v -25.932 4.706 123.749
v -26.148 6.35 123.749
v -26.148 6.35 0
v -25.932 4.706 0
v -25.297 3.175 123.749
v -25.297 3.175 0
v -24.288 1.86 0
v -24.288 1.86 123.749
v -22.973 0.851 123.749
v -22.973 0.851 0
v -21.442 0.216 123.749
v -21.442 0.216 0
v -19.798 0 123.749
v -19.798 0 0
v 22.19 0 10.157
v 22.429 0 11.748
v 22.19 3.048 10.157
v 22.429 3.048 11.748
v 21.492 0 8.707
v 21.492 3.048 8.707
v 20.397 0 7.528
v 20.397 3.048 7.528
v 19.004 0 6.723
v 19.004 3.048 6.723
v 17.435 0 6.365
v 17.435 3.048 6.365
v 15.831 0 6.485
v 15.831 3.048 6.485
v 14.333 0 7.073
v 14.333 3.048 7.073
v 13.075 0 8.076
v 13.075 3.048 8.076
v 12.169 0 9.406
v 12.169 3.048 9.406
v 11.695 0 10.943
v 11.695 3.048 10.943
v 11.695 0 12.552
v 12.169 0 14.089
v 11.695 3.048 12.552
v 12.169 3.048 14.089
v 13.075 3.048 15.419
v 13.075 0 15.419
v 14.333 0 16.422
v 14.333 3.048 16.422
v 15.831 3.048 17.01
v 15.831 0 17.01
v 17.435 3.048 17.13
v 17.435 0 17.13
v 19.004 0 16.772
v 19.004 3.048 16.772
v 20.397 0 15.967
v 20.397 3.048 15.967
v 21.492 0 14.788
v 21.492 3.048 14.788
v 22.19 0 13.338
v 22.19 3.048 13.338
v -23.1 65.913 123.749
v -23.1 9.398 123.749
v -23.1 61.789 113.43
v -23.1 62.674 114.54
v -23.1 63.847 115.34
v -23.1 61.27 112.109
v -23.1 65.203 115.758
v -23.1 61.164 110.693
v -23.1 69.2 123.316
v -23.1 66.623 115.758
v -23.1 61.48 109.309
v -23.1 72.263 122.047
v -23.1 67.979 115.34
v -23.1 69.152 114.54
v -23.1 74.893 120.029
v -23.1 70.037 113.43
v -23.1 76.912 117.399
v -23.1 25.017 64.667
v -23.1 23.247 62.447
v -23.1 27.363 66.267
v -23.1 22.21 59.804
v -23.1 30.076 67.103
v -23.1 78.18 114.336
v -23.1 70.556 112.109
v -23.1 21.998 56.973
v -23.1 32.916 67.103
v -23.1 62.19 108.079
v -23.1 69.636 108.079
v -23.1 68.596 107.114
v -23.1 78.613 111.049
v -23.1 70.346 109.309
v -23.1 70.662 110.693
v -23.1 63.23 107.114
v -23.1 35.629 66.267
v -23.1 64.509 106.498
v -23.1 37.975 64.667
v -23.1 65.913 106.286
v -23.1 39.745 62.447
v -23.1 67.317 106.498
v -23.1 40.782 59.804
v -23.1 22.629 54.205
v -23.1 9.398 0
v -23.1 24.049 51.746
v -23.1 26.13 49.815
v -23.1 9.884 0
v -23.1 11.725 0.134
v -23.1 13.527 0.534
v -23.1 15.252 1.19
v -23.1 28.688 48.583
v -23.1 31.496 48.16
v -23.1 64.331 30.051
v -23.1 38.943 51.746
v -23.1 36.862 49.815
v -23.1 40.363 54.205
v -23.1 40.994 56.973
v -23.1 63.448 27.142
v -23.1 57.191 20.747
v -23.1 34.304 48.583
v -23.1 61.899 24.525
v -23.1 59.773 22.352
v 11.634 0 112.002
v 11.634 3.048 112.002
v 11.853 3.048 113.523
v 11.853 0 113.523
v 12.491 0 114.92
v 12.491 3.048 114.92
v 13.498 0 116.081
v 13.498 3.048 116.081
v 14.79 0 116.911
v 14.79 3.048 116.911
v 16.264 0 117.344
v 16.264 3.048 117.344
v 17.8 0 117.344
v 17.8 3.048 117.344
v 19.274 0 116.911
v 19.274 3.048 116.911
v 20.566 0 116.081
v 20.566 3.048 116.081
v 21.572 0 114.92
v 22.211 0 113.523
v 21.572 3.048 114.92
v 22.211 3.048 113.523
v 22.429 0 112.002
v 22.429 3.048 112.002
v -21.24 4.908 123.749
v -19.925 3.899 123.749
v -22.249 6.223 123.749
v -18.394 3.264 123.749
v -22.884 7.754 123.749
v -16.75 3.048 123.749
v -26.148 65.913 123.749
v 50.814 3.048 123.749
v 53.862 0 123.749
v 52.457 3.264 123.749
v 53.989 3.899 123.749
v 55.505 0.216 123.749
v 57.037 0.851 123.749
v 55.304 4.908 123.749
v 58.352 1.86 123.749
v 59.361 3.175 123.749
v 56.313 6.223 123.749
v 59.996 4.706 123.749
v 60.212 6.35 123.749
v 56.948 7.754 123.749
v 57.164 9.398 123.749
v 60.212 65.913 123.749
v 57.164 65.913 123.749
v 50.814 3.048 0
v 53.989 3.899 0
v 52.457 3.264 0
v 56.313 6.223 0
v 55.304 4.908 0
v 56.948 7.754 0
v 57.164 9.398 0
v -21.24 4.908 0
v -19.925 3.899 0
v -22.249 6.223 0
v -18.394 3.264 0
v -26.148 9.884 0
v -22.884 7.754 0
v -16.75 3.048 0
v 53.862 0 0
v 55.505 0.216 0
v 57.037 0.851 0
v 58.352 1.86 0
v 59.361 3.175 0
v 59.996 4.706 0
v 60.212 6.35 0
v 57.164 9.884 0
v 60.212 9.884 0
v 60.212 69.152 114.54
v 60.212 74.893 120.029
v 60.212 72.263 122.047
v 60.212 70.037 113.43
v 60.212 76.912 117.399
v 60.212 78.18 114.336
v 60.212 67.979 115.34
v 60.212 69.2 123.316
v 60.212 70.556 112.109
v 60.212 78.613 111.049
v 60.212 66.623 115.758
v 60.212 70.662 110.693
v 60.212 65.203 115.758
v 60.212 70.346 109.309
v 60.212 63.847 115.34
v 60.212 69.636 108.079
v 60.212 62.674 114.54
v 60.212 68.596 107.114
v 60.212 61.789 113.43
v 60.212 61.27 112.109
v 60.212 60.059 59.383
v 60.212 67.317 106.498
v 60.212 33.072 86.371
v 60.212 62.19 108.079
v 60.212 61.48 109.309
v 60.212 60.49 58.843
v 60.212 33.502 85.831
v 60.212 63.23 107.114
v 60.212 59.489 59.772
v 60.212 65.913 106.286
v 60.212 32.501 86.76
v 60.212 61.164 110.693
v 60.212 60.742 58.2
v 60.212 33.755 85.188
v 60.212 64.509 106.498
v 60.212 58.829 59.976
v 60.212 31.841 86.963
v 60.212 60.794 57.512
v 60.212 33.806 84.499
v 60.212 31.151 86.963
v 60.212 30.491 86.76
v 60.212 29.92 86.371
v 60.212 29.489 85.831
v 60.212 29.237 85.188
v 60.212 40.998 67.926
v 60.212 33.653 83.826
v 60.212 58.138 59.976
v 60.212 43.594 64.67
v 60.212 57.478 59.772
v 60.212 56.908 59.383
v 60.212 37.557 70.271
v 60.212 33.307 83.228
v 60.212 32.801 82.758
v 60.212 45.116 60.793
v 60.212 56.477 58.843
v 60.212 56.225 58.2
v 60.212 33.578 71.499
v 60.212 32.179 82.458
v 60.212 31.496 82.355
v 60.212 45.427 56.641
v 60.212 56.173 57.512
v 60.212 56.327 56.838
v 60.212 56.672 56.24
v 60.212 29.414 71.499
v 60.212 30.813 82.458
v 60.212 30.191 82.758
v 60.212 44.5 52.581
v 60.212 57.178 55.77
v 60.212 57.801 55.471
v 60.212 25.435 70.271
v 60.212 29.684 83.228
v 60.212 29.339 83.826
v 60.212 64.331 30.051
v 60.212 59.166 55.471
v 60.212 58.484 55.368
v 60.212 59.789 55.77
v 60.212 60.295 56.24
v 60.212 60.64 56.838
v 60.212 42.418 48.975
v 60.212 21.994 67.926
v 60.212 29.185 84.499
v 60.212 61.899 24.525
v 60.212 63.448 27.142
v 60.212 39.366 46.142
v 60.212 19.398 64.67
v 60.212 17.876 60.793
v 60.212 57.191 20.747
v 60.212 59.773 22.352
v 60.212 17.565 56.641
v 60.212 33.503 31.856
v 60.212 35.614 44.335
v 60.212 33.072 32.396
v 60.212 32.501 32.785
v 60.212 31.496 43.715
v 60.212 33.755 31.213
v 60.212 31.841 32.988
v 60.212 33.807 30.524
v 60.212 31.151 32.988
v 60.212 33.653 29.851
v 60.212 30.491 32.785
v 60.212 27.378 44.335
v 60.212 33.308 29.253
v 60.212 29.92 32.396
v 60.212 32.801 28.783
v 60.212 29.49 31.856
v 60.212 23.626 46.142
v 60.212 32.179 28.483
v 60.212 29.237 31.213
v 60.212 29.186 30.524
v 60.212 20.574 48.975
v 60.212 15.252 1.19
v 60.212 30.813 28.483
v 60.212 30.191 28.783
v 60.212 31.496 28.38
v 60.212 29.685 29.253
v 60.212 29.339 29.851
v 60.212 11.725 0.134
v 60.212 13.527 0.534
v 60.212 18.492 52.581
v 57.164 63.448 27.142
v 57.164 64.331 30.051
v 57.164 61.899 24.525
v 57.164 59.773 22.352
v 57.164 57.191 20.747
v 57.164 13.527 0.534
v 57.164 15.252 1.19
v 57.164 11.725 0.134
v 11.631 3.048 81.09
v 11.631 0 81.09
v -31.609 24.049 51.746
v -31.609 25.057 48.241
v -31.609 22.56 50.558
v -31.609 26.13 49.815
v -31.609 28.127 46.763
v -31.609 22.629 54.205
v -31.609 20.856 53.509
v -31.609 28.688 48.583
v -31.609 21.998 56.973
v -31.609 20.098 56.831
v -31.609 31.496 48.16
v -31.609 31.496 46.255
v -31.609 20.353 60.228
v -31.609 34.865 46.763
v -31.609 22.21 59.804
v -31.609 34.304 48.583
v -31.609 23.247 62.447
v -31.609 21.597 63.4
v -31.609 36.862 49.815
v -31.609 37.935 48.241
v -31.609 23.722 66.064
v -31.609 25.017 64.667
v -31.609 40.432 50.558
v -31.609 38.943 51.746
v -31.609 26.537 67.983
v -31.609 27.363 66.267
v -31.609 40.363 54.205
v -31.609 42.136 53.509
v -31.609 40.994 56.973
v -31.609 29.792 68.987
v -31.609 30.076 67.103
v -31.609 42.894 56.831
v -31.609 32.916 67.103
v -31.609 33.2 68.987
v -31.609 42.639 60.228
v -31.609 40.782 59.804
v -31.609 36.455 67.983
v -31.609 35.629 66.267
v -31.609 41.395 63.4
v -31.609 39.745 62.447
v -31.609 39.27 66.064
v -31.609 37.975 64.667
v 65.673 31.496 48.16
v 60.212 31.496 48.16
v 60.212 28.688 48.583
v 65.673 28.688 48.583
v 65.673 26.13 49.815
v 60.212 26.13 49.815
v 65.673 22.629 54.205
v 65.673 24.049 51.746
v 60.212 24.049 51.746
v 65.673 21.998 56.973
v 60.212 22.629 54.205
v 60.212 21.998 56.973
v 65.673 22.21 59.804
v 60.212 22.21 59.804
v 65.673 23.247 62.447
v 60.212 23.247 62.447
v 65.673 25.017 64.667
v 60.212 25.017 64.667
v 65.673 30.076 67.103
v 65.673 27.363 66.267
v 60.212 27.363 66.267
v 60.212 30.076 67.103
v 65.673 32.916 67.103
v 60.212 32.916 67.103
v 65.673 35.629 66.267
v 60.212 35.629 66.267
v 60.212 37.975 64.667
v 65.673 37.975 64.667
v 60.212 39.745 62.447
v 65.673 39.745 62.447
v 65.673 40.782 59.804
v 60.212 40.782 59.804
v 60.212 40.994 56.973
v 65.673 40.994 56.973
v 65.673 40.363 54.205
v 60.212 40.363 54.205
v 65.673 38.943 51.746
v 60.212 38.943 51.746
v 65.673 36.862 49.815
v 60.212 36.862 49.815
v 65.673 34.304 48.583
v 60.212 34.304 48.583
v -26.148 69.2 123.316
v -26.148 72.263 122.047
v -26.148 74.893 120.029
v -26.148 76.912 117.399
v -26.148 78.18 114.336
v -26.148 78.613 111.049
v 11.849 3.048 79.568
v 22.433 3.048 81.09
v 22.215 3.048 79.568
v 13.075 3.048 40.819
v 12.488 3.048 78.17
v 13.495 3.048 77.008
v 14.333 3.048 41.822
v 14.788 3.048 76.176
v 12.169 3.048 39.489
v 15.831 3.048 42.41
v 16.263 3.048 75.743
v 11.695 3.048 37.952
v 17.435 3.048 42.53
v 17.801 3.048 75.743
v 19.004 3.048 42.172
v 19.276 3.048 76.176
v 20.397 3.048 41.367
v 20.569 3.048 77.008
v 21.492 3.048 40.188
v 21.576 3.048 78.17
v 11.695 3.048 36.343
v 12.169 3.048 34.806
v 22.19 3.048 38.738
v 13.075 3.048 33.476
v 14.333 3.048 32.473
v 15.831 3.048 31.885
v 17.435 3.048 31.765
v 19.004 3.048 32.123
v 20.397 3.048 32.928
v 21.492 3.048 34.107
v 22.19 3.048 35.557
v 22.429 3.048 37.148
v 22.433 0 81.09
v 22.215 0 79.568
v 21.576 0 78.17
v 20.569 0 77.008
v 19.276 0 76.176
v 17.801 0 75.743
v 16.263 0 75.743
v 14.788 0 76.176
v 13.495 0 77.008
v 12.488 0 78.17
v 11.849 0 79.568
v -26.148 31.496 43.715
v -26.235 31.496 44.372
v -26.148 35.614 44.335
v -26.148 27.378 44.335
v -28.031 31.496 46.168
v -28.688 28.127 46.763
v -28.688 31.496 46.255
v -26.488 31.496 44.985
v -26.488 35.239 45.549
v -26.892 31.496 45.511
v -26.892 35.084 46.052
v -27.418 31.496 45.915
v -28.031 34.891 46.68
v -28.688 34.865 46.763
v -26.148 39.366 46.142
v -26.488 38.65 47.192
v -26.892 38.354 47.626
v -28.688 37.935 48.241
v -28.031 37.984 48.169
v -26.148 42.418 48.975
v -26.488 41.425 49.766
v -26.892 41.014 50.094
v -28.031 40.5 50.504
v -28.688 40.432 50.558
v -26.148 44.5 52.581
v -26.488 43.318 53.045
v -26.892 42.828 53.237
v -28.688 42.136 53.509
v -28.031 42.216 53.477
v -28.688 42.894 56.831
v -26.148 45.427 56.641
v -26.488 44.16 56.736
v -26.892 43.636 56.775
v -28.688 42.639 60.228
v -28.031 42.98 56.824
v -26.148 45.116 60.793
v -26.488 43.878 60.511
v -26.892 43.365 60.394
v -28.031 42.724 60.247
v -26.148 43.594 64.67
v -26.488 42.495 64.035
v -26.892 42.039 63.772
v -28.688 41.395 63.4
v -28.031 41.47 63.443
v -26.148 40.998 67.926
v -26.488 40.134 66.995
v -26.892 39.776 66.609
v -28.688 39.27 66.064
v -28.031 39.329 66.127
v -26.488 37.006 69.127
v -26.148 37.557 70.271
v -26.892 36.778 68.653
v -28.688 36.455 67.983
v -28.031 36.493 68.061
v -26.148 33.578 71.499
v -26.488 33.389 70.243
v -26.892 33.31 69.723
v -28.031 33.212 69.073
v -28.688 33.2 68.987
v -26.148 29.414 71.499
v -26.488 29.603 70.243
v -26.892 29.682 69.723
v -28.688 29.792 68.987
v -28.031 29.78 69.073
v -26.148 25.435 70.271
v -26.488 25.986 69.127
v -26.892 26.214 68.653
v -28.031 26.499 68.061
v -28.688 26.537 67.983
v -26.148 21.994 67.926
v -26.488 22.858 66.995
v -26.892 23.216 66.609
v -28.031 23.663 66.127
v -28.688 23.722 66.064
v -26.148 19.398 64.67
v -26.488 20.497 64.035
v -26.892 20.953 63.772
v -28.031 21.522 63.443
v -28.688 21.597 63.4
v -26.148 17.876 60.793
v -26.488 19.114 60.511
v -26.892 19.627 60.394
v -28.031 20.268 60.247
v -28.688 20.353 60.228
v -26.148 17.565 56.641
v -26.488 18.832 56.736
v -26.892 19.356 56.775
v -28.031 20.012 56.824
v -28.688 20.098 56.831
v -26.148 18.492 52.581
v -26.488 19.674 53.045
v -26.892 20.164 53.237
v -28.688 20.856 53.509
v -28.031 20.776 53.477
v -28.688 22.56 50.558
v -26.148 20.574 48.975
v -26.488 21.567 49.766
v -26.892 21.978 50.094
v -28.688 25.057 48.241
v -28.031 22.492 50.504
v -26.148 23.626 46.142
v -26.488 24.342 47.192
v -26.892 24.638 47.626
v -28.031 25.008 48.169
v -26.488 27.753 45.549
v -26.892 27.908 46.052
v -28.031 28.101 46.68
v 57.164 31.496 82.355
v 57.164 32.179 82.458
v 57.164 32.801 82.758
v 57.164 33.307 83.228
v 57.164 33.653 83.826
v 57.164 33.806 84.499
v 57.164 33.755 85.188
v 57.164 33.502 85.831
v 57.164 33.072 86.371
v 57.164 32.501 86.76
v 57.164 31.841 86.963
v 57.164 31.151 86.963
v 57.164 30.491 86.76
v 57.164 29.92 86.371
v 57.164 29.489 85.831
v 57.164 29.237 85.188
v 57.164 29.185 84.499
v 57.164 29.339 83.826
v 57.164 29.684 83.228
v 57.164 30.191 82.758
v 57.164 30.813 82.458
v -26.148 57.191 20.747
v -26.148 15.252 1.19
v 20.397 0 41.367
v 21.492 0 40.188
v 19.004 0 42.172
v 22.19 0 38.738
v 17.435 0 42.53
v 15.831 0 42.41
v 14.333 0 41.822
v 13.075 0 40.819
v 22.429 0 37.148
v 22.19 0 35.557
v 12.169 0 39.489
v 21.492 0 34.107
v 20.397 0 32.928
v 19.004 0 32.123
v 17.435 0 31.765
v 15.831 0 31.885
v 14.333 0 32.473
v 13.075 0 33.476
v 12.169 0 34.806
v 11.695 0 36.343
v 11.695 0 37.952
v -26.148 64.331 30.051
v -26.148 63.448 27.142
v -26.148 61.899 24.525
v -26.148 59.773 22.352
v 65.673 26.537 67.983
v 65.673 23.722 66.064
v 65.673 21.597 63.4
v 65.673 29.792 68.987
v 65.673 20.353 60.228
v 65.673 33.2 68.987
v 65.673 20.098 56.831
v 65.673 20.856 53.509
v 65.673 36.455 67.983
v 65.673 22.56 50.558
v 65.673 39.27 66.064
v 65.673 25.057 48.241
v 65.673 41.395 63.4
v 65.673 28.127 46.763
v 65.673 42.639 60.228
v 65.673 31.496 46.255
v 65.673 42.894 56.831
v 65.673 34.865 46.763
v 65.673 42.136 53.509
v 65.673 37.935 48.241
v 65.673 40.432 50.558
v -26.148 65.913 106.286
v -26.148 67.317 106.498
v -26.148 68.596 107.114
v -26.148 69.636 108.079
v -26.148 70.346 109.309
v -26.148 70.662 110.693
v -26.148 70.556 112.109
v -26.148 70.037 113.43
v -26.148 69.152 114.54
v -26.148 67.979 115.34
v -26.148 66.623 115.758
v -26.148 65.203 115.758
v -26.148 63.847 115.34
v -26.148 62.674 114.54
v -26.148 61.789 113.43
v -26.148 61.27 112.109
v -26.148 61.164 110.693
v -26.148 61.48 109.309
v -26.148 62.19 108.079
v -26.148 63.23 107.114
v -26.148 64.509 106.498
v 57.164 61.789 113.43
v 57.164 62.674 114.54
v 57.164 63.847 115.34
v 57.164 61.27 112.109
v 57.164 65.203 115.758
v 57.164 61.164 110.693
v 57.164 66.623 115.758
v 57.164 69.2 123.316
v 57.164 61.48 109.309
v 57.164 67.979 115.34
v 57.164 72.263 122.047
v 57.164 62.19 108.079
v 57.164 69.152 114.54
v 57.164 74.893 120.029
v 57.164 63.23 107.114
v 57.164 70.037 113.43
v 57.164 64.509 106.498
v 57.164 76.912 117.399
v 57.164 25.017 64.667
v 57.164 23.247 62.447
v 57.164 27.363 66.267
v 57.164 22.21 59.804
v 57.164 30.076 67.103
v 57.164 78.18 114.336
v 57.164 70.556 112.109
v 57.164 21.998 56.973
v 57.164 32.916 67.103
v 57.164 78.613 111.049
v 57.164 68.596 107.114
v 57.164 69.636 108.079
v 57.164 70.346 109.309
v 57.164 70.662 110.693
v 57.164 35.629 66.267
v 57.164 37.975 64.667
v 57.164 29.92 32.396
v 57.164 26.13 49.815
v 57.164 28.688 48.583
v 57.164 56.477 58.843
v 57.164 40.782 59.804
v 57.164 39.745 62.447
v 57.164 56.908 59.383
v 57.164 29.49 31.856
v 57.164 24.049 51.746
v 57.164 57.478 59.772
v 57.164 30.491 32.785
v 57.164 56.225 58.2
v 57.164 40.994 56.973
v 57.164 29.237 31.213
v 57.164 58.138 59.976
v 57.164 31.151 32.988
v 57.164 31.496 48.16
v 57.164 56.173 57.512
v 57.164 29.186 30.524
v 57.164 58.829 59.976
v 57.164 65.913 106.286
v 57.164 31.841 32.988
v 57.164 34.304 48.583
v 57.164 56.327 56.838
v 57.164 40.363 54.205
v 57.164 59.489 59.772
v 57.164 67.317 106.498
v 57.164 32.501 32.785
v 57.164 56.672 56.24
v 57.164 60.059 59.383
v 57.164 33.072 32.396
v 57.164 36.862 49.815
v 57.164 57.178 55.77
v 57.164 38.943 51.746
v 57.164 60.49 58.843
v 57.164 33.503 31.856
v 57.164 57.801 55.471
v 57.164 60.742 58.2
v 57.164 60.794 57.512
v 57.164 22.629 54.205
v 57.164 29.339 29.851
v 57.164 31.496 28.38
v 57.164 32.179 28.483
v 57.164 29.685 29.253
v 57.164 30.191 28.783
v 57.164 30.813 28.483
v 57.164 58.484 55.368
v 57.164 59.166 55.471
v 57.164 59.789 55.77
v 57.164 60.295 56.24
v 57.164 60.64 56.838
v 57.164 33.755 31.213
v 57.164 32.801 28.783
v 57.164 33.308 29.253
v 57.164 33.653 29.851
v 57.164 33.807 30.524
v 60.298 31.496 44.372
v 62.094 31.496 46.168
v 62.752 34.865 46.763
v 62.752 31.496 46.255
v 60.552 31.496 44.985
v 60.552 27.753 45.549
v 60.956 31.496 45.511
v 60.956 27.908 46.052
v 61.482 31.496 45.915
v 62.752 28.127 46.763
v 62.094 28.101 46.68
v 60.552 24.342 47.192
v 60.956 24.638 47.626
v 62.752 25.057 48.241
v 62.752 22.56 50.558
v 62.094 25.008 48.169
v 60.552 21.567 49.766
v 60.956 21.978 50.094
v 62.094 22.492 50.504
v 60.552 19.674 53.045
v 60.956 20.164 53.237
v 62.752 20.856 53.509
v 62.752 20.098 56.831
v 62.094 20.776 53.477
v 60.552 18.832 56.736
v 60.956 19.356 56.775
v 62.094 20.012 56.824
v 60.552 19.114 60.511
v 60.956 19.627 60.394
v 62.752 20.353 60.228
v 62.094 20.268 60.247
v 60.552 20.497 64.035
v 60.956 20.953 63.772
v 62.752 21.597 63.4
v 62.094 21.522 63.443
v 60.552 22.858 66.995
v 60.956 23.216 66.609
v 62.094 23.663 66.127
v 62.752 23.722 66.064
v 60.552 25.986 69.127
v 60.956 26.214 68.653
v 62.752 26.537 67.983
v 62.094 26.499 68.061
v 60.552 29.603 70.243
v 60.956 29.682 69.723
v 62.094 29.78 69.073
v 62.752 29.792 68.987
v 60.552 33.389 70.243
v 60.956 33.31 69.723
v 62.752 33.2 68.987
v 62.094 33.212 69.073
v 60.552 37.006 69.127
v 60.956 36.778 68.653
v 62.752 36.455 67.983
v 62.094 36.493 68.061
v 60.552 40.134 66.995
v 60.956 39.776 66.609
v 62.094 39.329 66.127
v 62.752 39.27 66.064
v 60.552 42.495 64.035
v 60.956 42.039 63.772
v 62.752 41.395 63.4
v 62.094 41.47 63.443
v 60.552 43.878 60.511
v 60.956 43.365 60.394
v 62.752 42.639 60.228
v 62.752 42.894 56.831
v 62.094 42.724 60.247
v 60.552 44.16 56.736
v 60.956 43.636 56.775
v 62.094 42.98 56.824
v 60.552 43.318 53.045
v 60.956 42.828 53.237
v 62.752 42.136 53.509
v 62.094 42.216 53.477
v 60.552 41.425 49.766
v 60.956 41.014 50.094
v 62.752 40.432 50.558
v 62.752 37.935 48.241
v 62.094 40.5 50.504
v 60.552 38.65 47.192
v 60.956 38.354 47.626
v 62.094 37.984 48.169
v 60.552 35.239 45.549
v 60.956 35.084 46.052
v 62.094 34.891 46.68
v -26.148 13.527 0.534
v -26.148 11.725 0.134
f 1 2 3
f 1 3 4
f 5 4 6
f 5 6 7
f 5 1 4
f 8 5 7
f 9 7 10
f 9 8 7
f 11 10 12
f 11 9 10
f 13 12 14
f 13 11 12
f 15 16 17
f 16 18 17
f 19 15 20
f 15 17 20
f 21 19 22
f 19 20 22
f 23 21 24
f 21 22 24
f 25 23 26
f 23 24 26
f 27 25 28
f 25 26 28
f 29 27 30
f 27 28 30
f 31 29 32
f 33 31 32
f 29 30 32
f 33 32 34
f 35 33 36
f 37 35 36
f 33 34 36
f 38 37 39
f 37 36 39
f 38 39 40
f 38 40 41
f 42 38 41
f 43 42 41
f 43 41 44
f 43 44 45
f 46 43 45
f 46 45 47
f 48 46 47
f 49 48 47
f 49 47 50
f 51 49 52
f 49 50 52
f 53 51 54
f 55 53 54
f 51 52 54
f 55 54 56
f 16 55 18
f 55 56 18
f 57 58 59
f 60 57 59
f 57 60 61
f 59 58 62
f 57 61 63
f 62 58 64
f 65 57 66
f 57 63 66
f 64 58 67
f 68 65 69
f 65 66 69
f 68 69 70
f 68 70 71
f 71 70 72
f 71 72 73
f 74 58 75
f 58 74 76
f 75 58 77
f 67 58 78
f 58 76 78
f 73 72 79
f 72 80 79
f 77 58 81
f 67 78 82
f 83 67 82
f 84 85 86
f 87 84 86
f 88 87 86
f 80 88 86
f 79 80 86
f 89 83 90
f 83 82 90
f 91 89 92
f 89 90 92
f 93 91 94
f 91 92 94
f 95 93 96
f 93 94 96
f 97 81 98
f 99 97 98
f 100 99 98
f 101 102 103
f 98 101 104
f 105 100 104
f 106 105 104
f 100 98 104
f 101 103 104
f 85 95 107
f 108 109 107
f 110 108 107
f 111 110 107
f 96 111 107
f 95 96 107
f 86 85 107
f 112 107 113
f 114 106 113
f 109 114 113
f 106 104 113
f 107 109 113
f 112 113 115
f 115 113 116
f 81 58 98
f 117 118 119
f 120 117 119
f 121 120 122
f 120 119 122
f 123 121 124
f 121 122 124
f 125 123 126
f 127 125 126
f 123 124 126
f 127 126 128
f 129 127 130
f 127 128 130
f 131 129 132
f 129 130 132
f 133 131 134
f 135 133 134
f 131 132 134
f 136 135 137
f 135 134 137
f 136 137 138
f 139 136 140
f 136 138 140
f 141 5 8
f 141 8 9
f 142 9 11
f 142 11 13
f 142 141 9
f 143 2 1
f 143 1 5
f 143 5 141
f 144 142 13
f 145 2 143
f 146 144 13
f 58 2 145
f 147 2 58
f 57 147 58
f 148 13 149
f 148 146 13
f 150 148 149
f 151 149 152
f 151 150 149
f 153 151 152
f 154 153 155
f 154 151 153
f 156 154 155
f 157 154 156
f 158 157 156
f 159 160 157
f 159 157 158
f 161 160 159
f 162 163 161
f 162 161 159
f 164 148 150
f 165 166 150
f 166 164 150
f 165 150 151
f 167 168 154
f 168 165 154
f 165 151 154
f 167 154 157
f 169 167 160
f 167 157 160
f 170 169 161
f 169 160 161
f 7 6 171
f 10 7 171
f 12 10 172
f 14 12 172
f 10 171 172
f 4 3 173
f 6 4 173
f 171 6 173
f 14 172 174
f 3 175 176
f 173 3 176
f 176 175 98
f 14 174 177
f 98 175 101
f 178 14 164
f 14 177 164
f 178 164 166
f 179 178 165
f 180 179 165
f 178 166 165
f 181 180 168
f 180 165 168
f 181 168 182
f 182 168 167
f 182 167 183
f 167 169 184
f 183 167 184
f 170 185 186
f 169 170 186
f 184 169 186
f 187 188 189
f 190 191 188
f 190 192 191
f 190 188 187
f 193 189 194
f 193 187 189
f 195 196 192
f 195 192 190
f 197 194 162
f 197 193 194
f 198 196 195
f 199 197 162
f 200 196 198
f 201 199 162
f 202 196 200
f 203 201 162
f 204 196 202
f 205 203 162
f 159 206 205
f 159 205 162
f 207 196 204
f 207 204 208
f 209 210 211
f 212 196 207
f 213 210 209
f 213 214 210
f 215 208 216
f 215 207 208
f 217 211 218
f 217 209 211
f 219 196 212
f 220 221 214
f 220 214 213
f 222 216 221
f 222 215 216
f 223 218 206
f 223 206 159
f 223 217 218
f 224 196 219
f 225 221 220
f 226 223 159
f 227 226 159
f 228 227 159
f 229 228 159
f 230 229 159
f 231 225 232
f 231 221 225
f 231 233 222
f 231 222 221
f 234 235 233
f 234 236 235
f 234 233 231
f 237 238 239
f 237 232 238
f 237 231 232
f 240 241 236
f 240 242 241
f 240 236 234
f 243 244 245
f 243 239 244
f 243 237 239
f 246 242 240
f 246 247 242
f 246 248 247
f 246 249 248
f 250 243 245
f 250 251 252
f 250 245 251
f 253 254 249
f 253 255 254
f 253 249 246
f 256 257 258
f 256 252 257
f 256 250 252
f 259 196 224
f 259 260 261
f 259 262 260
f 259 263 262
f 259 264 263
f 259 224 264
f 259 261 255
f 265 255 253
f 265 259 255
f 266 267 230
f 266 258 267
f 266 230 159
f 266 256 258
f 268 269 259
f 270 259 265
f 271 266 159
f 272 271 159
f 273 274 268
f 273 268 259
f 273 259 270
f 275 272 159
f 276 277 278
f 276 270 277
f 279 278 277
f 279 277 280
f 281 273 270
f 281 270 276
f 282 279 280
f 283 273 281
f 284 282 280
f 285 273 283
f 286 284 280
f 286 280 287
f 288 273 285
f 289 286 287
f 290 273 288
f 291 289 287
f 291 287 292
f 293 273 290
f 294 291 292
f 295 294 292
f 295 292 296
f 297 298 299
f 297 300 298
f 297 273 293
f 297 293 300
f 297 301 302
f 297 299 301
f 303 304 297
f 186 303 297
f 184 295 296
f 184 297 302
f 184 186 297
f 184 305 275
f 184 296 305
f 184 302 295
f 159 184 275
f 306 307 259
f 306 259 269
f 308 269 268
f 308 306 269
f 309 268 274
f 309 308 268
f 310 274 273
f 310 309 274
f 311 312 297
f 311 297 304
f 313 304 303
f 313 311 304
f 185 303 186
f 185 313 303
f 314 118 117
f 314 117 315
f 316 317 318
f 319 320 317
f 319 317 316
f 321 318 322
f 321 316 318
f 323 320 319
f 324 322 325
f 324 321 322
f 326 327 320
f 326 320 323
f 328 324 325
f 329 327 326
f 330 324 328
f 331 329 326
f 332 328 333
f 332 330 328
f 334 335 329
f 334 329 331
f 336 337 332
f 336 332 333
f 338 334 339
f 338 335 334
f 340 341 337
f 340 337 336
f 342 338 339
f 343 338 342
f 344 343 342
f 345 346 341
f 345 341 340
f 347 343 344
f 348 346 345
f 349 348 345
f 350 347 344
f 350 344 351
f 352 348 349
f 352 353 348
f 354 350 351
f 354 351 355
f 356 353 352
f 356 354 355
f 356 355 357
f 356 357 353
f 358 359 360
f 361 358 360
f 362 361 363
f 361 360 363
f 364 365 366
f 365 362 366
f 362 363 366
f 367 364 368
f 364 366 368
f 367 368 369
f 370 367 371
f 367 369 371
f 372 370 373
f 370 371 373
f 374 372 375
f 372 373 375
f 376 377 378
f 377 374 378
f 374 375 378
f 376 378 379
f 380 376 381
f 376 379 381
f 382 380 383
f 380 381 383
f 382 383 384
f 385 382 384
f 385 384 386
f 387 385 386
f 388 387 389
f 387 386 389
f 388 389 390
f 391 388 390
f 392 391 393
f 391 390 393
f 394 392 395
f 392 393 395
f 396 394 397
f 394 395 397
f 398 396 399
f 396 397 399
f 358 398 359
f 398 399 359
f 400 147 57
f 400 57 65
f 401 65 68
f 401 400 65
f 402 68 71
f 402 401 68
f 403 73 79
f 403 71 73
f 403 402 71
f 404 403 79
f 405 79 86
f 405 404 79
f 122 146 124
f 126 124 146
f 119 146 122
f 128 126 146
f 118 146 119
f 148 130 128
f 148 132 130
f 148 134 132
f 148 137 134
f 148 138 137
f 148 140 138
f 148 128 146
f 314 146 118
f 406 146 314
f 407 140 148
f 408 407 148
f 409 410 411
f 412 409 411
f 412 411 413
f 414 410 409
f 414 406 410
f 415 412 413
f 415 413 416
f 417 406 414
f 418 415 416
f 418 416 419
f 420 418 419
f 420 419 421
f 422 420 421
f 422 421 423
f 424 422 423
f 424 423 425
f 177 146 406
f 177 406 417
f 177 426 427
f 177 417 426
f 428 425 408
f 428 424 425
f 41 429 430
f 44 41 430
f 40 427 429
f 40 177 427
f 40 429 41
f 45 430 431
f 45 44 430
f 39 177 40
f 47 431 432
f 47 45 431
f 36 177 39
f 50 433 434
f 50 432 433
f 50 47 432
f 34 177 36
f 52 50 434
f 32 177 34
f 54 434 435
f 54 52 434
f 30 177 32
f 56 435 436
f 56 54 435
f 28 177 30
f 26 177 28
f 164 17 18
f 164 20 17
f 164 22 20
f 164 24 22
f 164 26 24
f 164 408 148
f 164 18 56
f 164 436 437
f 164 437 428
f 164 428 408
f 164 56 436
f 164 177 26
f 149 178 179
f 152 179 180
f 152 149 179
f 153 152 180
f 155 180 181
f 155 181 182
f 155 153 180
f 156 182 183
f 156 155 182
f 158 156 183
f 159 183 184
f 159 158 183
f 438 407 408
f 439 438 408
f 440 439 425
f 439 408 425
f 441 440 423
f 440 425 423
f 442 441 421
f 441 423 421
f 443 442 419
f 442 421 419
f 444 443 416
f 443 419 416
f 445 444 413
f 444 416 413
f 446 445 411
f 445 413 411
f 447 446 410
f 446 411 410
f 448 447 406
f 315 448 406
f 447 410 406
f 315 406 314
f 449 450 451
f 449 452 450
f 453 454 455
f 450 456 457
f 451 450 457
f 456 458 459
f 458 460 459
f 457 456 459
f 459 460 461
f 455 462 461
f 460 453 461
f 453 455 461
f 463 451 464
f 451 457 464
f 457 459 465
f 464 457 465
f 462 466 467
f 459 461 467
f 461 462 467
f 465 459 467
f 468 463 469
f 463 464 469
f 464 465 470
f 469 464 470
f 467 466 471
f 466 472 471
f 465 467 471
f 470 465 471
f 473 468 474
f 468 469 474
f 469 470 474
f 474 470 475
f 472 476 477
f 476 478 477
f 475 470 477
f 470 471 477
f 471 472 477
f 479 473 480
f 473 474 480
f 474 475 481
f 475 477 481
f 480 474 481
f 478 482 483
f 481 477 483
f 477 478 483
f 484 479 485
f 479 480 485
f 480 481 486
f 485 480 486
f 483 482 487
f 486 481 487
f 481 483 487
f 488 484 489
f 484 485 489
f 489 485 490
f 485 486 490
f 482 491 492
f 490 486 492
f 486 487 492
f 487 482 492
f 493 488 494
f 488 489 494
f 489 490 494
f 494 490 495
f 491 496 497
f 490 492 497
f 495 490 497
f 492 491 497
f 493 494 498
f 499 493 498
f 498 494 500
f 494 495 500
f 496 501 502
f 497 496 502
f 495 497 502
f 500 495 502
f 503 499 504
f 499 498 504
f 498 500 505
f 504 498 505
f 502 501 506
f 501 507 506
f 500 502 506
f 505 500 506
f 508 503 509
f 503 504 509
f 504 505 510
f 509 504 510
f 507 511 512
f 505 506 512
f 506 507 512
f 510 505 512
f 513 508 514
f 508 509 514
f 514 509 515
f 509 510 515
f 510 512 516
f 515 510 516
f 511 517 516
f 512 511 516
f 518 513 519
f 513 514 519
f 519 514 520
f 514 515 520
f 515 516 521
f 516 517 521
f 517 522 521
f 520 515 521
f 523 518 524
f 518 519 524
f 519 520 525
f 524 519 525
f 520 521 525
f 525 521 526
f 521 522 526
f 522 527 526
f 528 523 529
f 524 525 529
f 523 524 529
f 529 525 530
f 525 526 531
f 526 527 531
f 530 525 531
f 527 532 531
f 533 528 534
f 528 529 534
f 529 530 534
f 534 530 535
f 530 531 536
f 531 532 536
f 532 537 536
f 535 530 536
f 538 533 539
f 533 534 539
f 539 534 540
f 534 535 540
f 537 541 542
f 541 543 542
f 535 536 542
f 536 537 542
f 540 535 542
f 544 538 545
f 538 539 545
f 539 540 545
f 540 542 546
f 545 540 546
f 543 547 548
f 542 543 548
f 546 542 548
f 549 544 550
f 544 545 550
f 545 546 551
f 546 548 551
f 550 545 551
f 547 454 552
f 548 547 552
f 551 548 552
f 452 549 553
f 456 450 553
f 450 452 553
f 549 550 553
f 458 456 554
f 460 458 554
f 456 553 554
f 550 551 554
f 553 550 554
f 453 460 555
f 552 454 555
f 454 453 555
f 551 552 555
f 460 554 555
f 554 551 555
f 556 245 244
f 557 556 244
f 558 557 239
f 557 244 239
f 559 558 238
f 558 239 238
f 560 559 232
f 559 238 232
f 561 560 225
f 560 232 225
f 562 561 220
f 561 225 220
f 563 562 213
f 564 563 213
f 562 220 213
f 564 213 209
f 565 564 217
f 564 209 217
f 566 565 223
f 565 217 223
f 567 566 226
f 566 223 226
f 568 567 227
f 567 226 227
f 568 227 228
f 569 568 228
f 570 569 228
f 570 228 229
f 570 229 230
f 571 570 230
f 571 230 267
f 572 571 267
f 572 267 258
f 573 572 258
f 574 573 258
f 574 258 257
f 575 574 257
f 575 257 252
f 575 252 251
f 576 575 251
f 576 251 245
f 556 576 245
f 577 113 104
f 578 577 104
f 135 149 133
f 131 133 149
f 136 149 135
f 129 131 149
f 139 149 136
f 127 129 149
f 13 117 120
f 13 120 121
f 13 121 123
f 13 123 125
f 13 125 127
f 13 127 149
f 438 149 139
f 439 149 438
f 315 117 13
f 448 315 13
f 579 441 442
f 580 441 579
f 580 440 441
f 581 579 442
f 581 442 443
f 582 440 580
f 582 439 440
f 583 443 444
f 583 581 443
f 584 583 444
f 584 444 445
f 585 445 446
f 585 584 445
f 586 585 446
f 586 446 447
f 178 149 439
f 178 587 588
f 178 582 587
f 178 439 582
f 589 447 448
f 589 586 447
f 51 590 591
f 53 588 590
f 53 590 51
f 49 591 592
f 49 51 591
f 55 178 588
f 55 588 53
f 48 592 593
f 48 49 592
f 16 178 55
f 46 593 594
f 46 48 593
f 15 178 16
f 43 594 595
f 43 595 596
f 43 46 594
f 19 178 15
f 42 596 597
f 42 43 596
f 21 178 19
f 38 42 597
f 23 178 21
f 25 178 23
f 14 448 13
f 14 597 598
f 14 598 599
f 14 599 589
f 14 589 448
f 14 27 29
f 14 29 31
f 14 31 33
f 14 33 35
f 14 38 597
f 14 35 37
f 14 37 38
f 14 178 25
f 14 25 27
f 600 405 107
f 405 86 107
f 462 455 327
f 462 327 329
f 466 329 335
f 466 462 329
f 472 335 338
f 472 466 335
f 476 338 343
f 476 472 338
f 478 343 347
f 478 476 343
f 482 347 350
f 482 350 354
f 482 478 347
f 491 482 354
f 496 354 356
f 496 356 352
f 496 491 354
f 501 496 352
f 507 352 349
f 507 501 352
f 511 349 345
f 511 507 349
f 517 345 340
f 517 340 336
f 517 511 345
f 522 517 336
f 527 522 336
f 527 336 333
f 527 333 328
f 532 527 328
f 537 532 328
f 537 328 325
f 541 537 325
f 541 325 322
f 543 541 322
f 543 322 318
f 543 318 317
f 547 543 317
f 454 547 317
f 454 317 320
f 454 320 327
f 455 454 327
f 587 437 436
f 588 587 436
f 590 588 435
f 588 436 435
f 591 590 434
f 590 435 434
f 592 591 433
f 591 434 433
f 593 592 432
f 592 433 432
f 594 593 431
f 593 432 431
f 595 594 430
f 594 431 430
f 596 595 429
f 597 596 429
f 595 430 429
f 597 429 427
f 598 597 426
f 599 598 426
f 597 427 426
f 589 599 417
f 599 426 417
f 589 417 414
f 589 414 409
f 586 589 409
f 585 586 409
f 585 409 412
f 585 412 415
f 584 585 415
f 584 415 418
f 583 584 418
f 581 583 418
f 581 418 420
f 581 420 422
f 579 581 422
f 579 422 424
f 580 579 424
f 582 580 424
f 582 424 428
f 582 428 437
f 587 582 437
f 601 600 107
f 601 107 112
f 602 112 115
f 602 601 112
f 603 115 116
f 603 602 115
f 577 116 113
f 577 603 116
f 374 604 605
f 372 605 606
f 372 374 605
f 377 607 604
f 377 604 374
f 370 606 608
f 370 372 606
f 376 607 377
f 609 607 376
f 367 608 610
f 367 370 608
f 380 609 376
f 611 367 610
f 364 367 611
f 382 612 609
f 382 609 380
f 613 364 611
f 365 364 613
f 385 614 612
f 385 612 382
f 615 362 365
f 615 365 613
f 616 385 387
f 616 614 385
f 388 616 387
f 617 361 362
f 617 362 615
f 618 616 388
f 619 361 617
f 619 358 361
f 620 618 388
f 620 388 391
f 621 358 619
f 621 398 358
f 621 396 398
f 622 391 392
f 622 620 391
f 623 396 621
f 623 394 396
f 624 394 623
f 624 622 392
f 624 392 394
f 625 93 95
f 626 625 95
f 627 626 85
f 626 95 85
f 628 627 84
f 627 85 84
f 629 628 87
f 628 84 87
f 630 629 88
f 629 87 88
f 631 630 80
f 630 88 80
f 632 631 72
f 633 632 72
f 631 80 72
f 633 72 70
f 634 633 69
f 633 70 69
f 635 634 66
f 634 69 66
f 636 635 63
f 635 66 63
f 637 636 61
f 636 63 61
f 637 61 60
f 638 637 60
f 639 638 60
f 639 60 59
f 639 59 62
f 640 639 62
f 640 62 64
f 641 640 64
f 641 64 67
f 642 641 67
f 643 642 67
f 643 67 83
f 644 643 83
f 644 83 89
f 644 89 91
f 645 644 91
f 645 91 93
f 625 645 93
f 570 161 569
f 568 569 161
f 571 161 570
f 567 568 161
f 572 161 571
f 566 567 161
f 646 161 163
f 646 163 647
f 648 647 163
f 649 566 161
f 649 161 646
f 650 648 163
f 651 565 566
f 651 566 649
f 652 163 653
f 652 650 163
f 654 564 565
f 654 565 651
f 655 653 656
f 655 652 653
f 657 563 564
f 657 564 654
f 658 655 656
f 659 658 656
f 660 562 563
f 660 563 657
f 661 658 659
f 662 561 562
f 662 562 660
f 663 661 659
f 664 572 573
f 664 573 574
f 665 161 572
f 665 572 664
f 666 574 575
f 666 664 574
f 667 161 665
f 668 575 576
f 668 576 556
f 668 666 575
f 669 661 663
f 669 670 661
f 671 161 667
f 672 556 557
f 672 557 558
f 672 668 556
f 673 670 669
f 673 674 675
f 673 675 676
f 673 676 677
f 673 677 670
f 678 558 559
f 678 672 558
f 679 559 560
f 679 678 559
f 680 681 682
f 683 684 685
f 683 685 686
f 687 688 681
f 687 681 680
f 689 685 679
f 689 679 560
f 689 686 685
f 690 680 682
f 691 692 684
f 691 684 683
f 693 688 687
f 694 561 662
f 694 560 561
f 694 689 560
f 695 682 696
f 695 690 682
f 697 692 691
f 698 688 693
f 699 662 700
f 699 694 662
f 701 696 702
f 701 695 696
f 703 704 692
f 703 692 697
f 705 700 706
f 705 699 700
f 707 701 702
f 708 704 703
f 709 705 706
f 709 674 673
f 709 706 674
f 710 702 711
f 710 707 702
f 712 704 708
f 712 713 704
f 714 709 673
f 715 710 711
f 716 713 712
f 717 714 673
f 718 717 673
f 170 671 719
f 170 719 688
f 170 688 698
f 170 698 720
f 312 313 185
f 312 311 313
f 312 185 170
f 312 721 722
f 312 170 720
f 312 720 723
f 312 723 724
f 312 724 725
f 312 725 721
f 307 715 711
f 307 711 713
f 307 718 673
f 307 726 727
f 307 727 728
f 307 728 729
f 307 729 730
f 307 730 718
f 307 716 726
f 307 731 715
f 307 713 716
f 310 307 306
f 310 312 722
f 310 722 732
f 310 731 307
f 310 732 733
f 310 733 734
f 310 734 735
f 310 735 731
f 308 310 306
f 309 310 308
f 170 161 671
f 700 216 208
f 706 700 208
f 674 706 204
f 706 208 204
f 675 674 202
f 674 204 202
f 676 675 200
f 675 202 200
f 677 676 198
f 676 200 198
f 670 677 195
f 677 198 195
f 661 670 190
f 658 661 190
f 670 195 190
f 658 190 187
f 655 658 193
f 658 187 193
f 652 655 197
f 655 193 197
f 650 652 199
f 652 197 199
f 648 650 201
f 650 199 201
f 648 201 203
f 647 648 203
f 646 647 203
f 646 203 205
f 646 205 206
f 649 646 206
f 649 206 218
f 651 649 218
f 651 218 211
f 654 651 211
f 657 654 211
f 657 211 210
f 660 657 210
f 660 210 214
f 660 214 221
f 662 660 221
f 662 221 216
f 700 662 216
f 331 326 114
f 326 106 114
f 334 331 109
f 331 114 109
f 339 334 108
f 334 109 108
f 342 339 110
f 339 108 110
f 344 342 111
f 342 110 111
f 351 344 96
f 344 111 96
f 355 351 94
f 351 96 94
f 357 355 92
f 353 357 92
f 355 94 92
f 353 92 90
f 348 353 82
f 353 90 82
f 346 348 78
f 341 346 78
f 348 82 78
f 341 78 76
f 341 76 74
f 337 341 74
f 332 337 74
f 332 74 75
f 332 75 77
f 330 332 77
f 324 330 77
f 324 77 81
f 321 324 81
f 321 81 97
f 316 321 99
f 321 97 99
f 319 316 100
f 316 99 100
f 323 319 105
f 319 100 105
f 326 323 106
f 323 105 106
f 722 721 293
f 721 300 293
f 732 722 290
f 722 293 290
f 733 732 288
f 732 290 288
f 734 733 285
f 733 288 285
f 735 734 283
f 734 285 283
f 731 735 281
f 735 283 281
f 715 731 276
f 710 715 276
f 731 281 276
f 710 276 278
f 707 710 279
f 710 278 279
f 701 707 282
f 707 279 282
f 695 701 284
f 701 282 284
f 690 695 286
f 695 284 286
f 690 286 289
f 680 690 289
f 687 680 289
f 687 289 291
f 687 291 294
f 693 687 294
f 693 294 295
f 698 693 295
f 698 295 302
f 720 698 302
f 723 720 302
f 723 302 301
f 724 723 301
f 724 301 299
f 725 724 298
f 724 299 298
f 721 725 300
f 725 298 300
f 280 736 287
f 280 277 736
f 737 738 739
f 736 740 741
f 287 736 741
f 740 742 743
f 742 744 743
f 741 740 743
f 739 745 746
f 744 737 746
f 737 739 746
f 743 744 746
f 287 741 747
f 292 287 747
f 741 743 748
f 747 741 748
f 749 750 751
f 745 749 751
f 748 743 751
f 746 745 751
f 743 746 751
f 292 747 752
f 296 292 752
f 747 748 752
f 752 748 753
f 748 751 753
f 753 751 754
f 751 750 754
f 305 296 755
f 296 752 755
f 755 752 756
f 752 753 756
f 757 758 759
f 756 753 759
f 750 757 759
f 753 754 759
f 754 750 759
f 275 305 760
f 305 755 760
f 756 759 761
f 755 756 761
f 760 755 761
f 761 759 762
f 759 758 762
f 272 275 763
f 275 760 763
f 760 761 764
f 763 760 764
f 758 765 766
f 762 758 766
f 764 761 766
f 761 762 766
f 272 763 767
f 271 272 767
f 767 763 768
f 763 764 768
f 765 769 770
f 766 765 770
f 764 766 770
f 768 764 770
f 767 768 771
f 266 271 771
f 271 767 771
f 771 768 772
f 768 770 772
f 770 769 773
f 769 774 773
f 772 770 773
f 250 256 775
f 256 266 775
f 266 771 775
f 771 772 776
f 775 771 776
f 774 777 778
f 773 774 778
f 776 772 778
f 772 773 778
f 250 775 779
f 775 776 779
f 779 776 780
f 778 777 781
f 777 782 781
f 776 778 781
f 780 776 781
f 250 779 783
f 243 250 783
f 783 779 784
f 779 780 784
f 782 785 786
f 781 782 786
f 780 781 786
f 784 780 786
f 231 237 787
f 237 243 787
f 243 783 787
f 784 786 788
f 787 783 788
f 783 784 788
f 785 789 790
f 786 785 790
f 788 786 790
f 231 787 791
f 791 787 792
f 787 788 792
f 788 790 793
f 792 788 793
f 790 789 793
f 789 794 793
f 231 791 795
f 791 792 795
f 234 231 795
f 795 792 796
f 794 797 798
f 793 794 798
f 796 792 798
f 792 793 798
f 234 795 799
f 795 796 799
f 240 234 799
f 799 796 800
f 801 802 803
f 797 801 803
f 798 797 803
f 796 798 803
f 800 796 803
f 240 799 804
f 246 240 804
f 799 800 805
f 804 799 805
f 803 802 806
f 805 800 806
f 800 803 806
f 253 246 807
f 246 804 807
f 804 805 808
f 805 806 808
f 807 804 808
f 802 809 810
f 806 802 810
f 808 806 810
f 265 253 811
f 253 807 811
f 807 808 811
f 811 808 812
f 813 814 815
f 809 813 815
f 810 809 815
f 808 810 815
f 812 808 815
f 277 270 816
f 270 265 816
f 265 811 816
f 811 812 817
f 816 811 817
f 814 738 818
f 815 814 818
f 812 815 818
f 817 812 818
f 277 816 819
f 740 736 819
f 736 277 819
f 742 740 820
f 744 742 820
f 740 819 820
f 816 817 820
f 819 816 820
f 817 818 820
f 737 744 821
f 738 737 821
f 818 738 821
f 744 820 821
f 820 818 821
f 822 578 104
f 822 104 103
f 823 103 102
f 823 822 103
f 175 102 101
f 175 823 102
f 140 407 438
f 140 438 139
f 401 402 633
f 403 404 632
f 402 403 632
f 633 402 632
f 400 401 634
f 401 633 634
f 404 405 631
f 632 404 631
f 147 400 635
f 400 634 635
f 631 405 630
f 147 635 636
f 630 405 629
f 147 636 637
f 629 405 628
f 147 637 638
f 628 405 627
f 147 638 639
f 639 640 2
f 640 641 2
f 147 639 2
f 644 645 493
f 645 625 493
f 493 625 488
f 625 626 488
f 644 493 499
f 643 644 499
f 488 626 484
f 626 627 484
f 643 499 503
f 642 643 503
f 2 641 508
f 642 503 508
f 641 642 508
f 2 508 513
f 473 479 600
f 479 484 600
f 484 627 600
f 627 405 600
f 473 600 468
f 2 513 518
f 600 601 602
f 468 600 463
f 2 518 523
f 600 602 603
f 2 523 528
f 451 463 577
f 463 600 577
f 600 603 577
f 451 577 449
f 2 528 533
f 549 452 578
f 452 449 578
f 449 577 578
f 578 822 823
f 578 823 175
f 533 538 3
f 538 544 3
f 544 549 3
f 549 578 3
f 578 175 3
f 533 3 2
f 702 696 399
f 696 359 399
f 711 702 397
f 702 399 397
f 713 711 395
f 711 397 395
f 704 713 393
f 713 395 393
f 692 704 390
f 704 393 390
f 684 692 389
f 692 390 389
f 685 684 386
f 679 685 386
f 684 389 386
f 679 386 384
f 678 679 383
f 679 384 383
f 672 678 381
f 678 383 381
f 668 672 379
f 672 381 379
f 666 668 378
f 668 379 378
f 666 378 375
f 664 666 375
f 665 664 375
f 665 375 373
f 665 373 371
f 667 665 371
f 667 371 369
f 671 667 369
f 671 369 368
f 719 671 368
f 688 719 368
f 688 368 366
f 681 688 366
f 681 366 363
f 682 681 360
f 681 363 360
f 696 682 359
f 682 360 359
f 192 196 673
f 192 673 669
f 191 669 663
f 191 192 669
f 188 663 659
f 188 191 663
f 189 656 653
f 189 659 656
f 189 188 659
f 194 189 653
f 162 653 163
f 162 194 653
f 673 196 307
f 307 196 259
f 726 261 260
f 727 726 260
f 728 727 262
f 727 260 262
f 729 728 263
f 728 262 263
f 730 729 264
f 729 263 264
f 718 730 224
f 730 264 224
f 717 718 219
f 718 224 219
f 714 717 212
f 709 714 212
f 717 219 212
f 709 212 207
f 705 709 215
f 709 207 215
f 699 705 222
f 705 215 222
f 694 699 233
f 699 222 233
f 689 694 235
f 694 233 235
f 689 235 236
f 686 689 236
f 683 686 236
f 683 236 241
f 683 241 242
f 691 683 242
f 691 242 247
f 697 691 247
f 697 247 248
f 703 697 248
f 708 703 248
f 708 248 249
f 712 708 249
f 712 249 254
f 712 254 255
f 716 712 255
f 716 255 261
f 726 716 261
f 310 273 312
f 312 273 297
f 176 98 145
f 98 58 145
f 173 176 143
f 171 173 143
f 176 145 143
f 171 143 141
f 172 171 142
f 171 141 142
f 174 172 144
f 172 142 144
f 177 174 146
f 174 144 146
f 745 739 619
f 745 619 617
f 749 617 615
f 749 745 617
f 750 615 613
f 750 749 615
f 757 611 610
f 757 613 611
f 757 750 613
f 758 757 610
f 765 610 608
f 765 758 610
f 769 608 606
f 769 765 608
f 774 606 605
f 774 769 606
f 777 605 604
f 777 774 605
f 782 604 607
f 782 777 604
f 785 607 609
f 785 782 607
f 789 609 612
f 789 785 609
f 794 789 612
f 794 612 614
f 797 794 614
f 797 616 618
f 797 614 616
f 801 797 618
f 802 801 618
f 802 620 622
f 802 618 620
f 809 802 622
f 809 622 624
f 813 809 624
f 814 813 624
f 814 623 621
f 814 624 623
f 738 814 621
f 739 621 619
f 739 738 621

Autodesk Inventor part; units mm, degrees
ref_plane "YZ Plane" through (0, 0, 0) normal (1, 0, 0) x (0, 1, 0)
ref_plane "XZ Plane" through (0, 0, 0) normal (0, 1, 0) x (-1, 0, 0)
sketch "Sketch1" plane through (0, 0, 0) normal (0, 0, 1) x (1, 0, 0)
  line L0 (-26.1481, 3.048) -> (60.2119, 3.048)
  line L1 (60.2119, 3.048) -> (60.2119, 0)
  line L2 (60.2119, 0) -> (-26.1481, 0)
  line L3 (-26.1481, 0) -> (-26.1481, 3.048)
  line L4 (-26.1481, 0) -> (-23.1001, 0)
  line L5 (-23.1001, 0) -> (-23.1001, 78.613)
  line L6 (-23.1001, 78.613) -> (-26.1481, 78.613)
  line L7 (-26.1481, 78.613) -> (-26.1481, 0)
  line L8 (60.2119, 0) -> (57.1639, 0)
  line L9 (57.1639, 0) -> (57.1639, 78.613)
  line L10 (57.1639, 78.613) -> (60.2119, 78.613)
  line L11 (60.2119, 78.613) -> (60.2119, 0)
  point P0 (0, 0)
  dimension "d0" = 86.36
  dimension "d1" = 3.048
  dimension "d2" = 3.048
  dimension "d3" = 3.048
  dimension "d4" = 78.613
  dimension "d5" = 0
extrude "Extrusion1" add sketch "Sketch1" along normal blind 123.7488
fillet "Fillet1" radius 12.7 2 edges at (58.6879, 78.613, 123.7488) (-24.6241, 78.613, 123.7488)
sketch "Sketch2" plane through (60.2119, 0, 0) normal (1, 0, 0) x (0, 0, -1)
  arc A0 (-111.0488, 78.613) -> (-123.7488, 65.913) centre (-111.0488, 65.913) ccw projected
  circle A1 centre (-111.0488, 65.913) radius 4.7625
  dimension "d9" = 9.525
extrude "Extrusion2" cut sketch "Sketch2" against normal through all
fillet "Fillet2" radius 6.35 4 edges at (57.1639, 3.048, 61.8744) (60.2119, 0, 61.8744) (-23.1001, 3.048, 61.8744) (-26.1481, 0, 61.8744)
sketch "Sketch3" plane through (60.2119, 78.613, 111.0488) normal (1, 0, 0) x (0, 0, -1)
  line L0 (111.0488, -72.263) -> (-12.7, -72.263) projected
  line L1 (111.0488, -72.263) -> (111.0488, 0) projected
  line L2 (111.0488, 0) -> (0, 0) projected
  line L3 (-12.7, -12.7) -> (-12.7, -72.263) projected
  line L4 (111.0488, -65.913) -> (-12.7, -65.913)
  line L5 (0, 0) -> (87.5082, -15.4301)
  line L6 (87.5082, -15.4301) -> (111.0488, -65.913)
  point P0 (111.0488, -78.613)
  dimension "d13" = 6.35
  dimension "d15" = 125
  dimension "d16" = 65
extrude "Extrusion3" cut sketch "Sketch3" against normal through all contours L6 L5 L2 L1
fillet "Fillet3" radius 12.7 2 edges at (58.6879, 63.1829, 23.5406) (-24.6241, 63.1829, 23.5406)
fillet "Fillet4" radius 12.7 2 edges at (58.6879, 12.7, 0) (-24.6241, 12.7, 0)
sketch "Sketch4" plane through (-16.7501, 3.048, 0) normal (0, 1, 0) x (1, 0, 0)
  line L0 (0, -123.7488) -> (67.564, -123.7488) projected
  line L1 (67.564, 0) -> (0, 0) projected
  circle A0 centre (33.782, -11.7475) radius 5.3975
  circle A1 centre (33.782, -37.1475) radius 5.3975
  arc A2 (28.3845, -112.002) -> (39.1795, -112.002) centre (33.782, -112.0013) ccw
  arc A3 (39.1833, -81.0902) -> (28.3807, -81.0902) centre (33.782, -81.0895) ccw
  line L2 (28.3845, -112.002) -> (28.3807, -81.0902)
  line L3 (39.1833, -81.0902) -> (39.1795, -112.002)
  point P0 (16.7501, 0)
  dimension "d21" = 10.795
  dimension "d22" = 10.795
  dimension "d23" = 25.4
  dimension "d24" = 11.7475
  dimension "d25" = 10.795
  dimension "d26" = 10.8026
  dimension "d27" = 11.7475
  dimension "d28" = 30.9118
  dimension "d29" = 30.9118
  dimension "d30" = 30.9118
extrude "Extrusion4" cut sketch "Sketch4" against normal through all
sketch "Sketch5" plane through (60.2119, 6.35, 123.7488) normal (1, 0, 0) x (0, 0, -1)
  circle A0 centre (12.7, 59.563) radius 4.7625 projected
  circle A1 centre (66.064, 25.146) radius 9.525
  circle A2 centre (66.064, 25.146) radius 11.43
  line L0 (0, -6.35) -> (123.7488, -6.35) projected
  dimension "d33" = 19.05
  dimension "d36" = 22.86
  dimension "d37" = 31.496
  dimension "d38" = 63.5
extrude "Extrusion5" add sketch "Sketch5" along normal blind 5.461 contours A2
sketch "Sketch6" plane through (60.2119, 31.496, 57.6848) normal (1, 0, 0) x (0, 0, -1)
  circle A0 centre (0, 0) radius 9.525 projected
  point P0 (57.6848, -31.496)
ref_plane "Work Plane1" through (17.0319, 0, 117.3988) normal (1, 0, 0) x (0, 1, 0)
mirror "Mirror1" about plane through (17.0319, 0, 117.3988) normal (1, 0, 0) of "Extrusion5"
extrude "Extrusion6" cut sketch "Sketch6" against normal through all
fillet "Fillet5" radius 2.54 2 edges at (60.2119, 31.496, 69.1148) (-26.1482, 31.496, 69.1148)
sketch "Sketch7" plane through (60.2119, 6.35, 123.7488) normal (1, 0, 0) x (0, 0, -1)
  circle A0 centre (39.0765, 25.1459) radius 2.317 projected
  circle A1 centre (93.0515, 25.1461) radius 2.317 projected
  circle A2 centre (66.064, 25.146) radius 14.2875 projected
  line L0 (97.8141, -6.6039) -> (97.814, 56.8961) projected
  line L1 (34.3141, -6.6041) -> (97.8141, -6.6039) projected
  line L2 (34.314, 56.8959) -> (34.3141, -6.6041) projected
  line L3 (97.814, 56.8961) -> (34.314, 56.8959) projected
  circle A3 centre (66.0641, -1.8415) radius 2.317 projected
  circle A4 centre (66.064, 52.1335) radius 2.317 projected
  point P0 (123.7488, -6.35)
extrude "Extrusion7" cut sketch "Sketch7" against normal up to surface (3.048 mm away) contours A0 | A1 | A4
equation "\"d27\" = d24"
equation "\"d29\" = d28"
properties part number "Ratchet Frame 1764"
